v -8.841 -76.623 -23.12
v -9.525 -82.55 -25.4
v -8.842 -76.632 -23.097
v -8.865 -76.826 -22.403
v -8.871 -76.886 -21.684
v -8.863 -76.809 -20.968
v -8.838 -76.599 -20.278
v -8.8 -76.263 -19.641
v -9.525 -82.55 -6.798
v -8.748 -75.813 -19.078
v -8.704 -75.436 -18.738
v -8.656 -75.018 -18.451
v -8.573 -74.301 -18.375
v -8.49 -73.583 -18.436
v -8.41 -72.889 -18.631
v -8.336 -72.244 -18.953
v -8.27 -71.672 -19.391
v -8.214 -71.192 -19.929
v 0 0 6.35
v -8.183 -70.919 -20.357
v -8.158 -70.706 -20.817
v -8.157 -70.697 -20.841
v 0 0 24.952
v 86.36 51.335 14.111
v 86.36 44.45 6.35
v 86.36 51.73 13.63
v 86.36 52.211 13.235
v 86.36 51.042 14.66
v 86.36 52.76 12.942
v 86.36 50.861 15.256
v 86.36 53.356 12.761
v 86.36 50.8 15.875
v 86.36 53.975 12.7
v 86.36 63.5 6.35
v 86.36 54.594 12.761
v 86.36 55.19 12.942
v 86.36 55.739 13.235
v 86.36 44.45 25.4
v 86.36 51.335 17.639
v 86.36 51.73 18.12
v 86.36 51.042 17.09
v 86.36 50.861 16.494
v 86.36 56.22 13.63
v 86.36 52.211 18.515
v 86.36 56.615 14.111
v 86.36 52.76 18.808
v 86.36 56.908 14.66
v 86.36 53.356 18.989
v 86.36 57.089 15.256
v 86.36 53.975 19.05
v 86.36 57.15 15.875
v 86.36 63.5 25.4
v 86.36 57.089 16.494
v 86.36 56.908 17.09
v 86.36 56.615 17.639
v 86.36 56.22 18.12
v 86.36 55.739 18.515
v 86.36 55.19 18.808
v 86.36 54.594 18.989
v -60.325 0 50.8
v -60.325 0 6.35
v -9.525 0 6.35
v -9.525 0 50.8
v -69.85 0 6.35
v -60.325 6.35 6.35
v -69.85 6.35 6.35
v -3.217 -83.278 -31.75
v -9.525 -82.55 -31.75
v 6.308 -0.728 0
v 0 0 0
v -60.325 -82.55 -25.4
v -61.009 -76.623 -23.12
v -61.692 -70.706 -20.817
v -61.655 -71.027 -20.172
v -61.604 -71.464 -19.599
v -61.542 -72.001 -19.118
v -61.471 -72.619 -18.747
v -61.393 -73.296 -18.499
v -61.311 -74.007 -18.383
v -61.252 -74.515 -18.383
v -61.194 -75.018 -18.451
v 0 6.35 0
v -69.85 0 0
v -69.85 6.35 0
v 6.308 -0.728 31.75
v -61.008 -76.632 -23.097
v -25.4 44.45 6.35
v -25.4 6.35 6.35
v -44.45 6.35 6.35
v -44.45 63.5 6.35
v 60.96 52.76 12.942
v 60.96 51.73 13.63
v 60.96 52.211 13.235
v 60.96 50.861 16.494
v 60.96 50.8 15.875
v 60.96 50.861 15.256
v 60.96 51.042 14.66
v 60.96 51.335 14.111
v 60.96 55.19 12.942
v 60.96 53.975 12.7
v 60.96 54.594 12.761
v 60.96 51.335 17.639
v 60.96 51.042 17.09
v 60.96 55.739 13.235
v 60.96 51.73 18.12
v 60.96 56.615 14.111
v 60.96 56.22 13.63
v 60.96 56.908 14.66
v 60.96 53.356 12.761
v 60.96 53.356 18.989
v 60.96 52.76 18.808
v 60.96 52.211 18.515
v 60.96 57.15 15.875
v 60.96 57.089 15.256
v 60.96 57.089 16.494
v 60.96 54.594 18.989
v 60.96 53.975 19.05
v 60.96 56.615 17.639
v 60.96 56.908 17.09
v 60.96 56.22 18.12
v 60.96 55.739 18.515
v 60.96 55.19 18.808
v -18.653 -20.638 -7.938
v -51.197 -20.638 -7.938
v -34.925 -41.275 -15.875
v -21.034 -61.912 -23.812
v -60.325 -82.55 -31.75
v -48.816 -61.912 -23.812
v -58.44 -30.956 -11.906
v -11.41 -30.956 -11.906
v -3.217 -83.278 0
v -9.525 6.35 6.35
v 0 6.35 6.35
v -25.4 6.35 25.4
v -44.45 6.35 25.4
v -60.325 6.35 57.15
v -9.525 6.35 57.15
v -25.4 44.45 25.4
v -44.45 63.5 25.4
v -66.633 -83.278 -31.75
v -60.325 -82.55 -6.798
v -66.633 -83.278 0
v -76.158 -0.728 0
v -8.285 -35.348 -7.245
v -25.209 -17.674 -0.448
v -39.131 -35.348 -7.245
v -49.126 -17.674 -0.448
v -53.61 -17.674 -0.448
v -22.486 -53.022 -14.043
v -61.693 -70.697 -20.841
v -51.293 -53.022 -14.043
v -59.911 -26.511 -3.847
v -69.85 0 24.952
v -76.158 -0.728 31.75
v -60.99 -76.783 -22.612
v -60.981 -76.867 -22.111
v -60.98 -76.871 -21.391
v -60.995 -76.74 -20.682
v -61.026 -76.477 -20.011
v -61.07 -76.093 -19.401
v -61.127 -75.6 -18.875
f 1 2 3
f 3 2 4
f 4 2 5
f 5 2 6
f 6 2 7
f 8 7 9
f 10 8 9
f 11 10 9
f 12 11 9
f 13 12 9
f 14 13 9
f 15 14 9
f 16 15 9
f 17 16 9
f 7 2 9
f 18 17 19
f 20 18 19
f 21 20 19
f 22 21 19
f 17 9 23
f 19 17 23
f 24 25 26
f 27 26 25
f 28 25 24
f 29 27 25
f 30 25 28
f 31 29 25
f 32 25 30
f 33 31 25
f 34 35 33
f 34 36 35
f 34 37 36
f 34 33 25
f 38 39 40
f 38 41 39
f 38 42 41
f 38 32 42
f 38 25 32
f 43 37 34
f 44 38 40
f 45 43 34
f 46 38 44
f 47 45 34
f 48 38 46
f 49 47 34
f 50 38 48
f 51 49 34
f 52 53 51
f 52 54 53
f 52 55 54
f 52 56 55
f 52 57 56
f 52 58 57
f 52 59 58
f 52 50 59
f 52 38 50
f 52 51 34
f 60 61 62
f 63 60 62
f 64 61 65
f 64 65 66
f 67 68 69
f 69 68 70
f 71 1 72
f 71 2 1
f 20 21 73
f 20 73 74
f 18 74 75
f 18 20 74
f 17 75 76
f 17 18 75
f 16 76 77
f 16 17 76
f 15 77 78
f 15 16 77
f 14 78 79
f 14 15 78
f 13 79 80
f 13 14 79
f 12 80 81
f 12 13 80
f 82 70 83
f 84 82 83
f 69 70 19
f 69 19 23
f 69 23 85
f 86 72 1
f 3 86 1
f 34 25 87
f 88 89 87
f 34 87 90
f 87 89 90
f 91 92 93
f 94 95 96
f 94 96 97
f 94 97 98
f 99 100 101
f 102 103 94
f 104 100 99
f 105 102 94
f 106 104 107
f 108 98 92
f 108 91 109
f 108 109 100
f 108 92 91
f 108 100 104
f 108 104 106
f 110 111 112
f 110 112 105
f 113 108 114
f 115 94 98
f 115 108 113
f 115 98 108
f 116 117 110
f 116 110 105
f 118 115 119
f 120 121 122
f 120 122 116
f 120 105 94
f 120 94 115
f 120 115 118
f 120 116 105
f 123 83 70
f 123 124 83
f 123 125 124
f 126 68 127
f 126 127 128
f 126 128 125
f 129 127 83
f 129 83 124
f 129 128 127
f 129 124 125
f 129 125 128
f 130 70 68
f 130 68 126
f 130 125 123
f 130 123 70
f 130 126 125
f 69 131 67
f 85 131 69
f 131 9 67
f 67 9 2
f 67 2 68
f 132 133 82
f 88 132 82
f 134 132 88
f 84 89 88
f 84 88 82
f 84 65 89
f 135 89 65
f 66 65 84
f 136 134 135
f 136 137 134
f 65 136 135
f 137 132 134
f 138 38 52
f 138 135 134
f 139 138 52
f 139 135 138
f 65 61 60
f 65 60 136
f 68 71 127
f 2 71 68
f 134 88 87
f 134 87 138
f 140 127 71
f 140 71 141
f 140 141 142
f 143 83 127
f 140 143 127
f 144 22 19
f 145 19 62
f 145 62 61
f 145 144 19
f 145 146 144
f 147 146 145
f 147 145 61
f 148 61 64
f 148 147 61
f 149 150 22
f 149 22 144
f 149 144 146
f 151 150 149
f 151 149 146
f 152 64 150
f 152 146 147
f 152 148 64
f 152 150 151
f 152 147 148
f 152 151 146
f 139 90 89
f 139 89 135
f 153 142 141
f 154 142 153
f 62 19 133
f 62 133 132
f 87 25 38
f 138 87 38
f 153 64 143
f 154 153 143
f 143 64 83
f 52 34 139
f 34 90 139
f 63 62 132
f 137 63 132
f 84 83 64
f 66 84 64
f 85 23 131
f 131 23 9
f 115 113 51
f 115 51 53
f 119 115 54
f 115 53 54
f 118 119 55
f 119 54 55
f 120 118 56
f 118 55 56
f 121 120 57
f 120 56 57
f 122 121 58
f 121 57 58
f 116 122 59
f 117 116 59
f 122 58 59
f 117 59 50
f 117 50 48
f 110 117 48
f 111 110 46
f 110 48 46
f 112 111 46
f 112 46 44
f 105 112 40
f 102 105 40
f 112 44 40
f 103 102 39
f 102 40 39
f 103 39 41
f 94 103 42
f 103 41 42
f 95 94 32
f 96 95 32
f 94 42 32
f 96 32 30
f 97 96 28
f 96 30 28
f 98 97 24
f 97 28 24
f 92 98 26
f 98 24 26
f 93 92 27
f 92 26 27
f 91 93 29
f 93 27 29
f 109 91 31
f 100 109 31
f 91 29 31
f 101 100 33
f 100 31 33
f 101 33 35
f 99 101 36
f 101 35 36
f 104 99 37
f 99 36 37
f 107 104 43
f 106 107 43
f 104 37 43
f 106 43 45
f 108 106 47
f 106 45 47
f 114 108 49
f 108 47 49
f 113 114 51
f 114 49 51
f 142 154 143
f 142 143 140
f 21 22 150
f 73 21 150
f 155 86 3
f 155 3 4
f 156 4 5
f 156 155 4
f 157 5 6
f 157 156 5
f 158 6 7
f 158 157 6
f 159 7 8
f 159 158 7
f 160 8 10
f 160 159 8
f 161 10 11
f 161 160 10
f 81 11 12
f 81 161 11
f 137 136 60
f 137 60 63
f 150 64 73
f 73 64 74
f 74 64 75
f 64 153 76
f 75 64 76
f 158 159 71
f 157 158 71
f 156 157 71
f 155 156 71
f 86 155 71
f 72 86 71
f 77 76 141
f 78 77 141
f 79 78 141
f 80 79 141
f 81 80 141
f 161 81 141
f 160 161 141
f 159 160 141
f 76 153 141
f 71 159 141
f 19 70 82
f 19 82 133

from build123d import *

# Parameters (mm, degrees)
F0_W          = 69.85
F0_H          = 6.35
F2_W          = 50.8
F2_H          = 6.35
F5_DEPTH      = 6.35
F7_DEPTH      = 6.35
F9_DEPTH      = 3.8354
F10_T4_DEPTH  = 70.8999806704
F10_T10_DEPTH = 72.2676909626
F11_W         = 69.85
F11_H         = 6.35
F12_DEPTH     = 6.35
F13_W         = 50.8
F13_H         = 6.35
F14_DEPTH     = 50.8
F15_SIZE      = 6.34999
F16_W         = 19.05
F16_H         = 19.05
F17_DEPTH     = 57.15
F18_W         = 19.05
F18_H         = 19.05
F19_DEPTH     = 111.76
F20_SIZE      = 6.34999
F21_R         = 3.175
F22_DEPTH     = 25.4


# Not quite as in the source:
# - a fillet or chamfer that OpenCascade refuses, or shapes differently, is made with other operations: its cross-section is extruded or revolved along the edge and cut away or added
# - a fillet or chamfer is up to 0.001 mm smaller than in the source, because OpenCascade refuses the exact size


with BuildPart() as f3:
    # F0 (on Front) → F3 section 0
    with BuildSketch(Plane.XZ):
        with Locations((-34.925, 3.175)):
            Rectangle(F0_W, F0_H)
    # F2 (on offset) → F3 section 1
    with BuildSketch(Plane.XZ.offset(82.55)):
        with Locations((-34.925, -28.575)):
            Rectangle(F2_W, F2_H)
    loft()

    # F4 (on face) → F5 (join)
    with BuildSketch(Plane(origin=(-68.9322627737, -7.9537226277, 0), x_dir=(0.114624108, -0.9934089359, 0), z_dir=(-0.9934089359, -0.114624108, 0))):
        Polygon((-8.0064939428, 31.75), (-8.0064939428, 6.35), (-8.0064939428, 0), (75.091208342, -31.75), (75.091208342, -25.4), (75.091208342, 0), align=None)
    extrude(amount=F5_DEPTH)

    # F6 (on face) → F7 (join)
    with BuildSketch(Plane(origin=(0, 0, 0), x_dir=(0.114624108, 0.9934089359, 0), z_dir=(0.9934089359, -0.114624108, 0))):
        Polygon((-83.0977022847, 0), (-83.0977022847, -31.75), (0, 0), (0, 31.75), align=None)
    extrude(amount=F7_DEPTH)

    # F8 (on face) → F9 (join)
    with BuildSketch(Plane(origin=(0, -2.1275773196, 5.5317010309), x_dir=(1, 0, 0), z_dir=(0, -0.3589790793, 0.9333456062))):
        Polygon((-61.6927102922, -73.4657484065), (-61.0088551461, -79.8157484065), (-8.8411448539, -79.8157484065), (-8.1572897078, -73.4657484065), align=None)
    extrude(amount=F9_DEPTH)

    # F10: fillet of radius 3.81 on 2 edges, made by hand


with BuildPart() as f10_tool2:
    # F10_s3 → F10_t4 (new body)
    with BuildSketch(Plane.YZ.offset(-70.3749903352)):
        with BuildLine():
            ThreePointArc((-76.6323734692, -23.096775868), (-76.5579487098, -20.1816780202), (-74.4440370018, -18.1730188162))
            Line((-74.4440370018, -18.1730188162), (-78.0000837614, -19.5407291084))
            Line((-78.0000837614, -19.5407291084), (-76.6323734692, -23.096775868))
        make_face()
    extrude(amount=F10_T4_DEPTH)

    split(bisect_by=Plane(origin=(0, 0, 0), x_dir=(0, 0, 1), z_dir=(-0.9934089359, 0.114624108, 0)), keep=Keep.TOP)

    split(bisect_by=Plane(origin=(-68.9322627737, -7.9537226277, 0), x_dir=(0, 0, 1), z_dir=(0.9934089359, 0.114624108, 0)), keep=Keep.TOP)


with BuildPart() as f3_1:
    add(f3.part)

    # F10_t1: cut F10_tool2
    add(f10_tool2.part, mode=Mode.SUBTRACT)


with BuildPart() as f10_tool8:
    # F10_s9 → F10_t10 (new body)
    with BuildSketch(Plane.YZ.offset(1.2088454813)):
        with BuildLine():
            ThreePointArc((-70.7056288698, -20.8172587144), (-72.7142880738, -18.7033470063), (-75.6293859216, -18.6289222469))
            Line((-75.6293859216, -18.6289222469), (-72.073339162, -17.2612119547))
            Line((-72.073339162, -17.2612119547), (-70.7056288698, -20.8172587144))
        make_face()
    extrude(amount=-F10_T10_DEPTH)

    split(bisect_by=Plane(origin=(0, 0, 0), x_dir=(0, 0, 1), z_dir=(-0.9934089359, 0.114624108, 0)), keep=Keep.TOP)

    split(bisect_by=Plane(origin=(-68.9322627737, -7.9537226277, 0), x_dir=(0, 0, 1), z_dir=(0.9934089359, 0.114624108, 0)), keep=Keep.TOP)


with BuildPart() as f3_2:
    add(f3_1.part)

    # F10_t7: cut F10_tool8
    add(f10_tool8.part, mode=Mode.SUBTRACT)

    # F11 (on face) → F12 (join)
    with BuildSketch(Plane(origin=(0, 0, 0), x_dir=(-1, 0, 0), z_dir=(0, 1, 0))):
        with Locations((34.925, 3.175)):
            Rectangle(F11_W, F11_H)
    extrude(amount=F12_DEPTH)

    # F13 (on face) → F14 (join)
    with BuildSketch(Plane.XY.offset(6.35)):
        with Locations((-34.925, 3.175)):
            Rectangle(F13_W, F13_H)
    extrude(amount=F14_DEPTH)

    # F15 (size 6.35 in the source; OpenCascade refuses exactly that, so slightly less here)
    f15_edges = [f3_2.edges().sort_by_distance(p)[0] for p in [
        (-34.925, 0, 57.15),
    ]]
    chamfer(f15_edges, length=F15_SIZE)

    # F16 (on face) → F17 (join)
    with BuildSketch(Plane(origin=(0, 6.35, 0), x_dir=(-1, 0, 0), z_dir=(0, 1, 0))):
        with Locations((34.925, 15.875)):
            Rectangle(F16_W, F16_H)
    extrude(amount=F17_DEPTH)

    # F18 (on face) → F19 (join)
    with BuildSketch(Plane.YZ.offset(-25.4)):
        with Locations((53.975, 15.875)):
            Rectangle(F18_W, F18_H)
    extrude(amount=F19_DEPTH)

    # F20 (size 6.35 in the source; OpenCascade refuses exactly that, so slightly less here)
    f20_edges = [f3_2.edges().sort_by_distance(p)[0] for p in [
        (-65.0875, -41.275, 15.875),
        (-4.7625, -41.275, 15.875),
    ]]
    chamfer(f20_edges, length=F20_SIZE)

    # F21 (on face) → F22 (cut)
    with BuildSketch(Plane.YZ.offset(86.36)):
        with Locations((53.975, 15.875)):
            Circle(F21_R)
    extrude(amount=-F22_DEPTH, mode=Mode.SUBTRACT)


solid = f3_2.part
